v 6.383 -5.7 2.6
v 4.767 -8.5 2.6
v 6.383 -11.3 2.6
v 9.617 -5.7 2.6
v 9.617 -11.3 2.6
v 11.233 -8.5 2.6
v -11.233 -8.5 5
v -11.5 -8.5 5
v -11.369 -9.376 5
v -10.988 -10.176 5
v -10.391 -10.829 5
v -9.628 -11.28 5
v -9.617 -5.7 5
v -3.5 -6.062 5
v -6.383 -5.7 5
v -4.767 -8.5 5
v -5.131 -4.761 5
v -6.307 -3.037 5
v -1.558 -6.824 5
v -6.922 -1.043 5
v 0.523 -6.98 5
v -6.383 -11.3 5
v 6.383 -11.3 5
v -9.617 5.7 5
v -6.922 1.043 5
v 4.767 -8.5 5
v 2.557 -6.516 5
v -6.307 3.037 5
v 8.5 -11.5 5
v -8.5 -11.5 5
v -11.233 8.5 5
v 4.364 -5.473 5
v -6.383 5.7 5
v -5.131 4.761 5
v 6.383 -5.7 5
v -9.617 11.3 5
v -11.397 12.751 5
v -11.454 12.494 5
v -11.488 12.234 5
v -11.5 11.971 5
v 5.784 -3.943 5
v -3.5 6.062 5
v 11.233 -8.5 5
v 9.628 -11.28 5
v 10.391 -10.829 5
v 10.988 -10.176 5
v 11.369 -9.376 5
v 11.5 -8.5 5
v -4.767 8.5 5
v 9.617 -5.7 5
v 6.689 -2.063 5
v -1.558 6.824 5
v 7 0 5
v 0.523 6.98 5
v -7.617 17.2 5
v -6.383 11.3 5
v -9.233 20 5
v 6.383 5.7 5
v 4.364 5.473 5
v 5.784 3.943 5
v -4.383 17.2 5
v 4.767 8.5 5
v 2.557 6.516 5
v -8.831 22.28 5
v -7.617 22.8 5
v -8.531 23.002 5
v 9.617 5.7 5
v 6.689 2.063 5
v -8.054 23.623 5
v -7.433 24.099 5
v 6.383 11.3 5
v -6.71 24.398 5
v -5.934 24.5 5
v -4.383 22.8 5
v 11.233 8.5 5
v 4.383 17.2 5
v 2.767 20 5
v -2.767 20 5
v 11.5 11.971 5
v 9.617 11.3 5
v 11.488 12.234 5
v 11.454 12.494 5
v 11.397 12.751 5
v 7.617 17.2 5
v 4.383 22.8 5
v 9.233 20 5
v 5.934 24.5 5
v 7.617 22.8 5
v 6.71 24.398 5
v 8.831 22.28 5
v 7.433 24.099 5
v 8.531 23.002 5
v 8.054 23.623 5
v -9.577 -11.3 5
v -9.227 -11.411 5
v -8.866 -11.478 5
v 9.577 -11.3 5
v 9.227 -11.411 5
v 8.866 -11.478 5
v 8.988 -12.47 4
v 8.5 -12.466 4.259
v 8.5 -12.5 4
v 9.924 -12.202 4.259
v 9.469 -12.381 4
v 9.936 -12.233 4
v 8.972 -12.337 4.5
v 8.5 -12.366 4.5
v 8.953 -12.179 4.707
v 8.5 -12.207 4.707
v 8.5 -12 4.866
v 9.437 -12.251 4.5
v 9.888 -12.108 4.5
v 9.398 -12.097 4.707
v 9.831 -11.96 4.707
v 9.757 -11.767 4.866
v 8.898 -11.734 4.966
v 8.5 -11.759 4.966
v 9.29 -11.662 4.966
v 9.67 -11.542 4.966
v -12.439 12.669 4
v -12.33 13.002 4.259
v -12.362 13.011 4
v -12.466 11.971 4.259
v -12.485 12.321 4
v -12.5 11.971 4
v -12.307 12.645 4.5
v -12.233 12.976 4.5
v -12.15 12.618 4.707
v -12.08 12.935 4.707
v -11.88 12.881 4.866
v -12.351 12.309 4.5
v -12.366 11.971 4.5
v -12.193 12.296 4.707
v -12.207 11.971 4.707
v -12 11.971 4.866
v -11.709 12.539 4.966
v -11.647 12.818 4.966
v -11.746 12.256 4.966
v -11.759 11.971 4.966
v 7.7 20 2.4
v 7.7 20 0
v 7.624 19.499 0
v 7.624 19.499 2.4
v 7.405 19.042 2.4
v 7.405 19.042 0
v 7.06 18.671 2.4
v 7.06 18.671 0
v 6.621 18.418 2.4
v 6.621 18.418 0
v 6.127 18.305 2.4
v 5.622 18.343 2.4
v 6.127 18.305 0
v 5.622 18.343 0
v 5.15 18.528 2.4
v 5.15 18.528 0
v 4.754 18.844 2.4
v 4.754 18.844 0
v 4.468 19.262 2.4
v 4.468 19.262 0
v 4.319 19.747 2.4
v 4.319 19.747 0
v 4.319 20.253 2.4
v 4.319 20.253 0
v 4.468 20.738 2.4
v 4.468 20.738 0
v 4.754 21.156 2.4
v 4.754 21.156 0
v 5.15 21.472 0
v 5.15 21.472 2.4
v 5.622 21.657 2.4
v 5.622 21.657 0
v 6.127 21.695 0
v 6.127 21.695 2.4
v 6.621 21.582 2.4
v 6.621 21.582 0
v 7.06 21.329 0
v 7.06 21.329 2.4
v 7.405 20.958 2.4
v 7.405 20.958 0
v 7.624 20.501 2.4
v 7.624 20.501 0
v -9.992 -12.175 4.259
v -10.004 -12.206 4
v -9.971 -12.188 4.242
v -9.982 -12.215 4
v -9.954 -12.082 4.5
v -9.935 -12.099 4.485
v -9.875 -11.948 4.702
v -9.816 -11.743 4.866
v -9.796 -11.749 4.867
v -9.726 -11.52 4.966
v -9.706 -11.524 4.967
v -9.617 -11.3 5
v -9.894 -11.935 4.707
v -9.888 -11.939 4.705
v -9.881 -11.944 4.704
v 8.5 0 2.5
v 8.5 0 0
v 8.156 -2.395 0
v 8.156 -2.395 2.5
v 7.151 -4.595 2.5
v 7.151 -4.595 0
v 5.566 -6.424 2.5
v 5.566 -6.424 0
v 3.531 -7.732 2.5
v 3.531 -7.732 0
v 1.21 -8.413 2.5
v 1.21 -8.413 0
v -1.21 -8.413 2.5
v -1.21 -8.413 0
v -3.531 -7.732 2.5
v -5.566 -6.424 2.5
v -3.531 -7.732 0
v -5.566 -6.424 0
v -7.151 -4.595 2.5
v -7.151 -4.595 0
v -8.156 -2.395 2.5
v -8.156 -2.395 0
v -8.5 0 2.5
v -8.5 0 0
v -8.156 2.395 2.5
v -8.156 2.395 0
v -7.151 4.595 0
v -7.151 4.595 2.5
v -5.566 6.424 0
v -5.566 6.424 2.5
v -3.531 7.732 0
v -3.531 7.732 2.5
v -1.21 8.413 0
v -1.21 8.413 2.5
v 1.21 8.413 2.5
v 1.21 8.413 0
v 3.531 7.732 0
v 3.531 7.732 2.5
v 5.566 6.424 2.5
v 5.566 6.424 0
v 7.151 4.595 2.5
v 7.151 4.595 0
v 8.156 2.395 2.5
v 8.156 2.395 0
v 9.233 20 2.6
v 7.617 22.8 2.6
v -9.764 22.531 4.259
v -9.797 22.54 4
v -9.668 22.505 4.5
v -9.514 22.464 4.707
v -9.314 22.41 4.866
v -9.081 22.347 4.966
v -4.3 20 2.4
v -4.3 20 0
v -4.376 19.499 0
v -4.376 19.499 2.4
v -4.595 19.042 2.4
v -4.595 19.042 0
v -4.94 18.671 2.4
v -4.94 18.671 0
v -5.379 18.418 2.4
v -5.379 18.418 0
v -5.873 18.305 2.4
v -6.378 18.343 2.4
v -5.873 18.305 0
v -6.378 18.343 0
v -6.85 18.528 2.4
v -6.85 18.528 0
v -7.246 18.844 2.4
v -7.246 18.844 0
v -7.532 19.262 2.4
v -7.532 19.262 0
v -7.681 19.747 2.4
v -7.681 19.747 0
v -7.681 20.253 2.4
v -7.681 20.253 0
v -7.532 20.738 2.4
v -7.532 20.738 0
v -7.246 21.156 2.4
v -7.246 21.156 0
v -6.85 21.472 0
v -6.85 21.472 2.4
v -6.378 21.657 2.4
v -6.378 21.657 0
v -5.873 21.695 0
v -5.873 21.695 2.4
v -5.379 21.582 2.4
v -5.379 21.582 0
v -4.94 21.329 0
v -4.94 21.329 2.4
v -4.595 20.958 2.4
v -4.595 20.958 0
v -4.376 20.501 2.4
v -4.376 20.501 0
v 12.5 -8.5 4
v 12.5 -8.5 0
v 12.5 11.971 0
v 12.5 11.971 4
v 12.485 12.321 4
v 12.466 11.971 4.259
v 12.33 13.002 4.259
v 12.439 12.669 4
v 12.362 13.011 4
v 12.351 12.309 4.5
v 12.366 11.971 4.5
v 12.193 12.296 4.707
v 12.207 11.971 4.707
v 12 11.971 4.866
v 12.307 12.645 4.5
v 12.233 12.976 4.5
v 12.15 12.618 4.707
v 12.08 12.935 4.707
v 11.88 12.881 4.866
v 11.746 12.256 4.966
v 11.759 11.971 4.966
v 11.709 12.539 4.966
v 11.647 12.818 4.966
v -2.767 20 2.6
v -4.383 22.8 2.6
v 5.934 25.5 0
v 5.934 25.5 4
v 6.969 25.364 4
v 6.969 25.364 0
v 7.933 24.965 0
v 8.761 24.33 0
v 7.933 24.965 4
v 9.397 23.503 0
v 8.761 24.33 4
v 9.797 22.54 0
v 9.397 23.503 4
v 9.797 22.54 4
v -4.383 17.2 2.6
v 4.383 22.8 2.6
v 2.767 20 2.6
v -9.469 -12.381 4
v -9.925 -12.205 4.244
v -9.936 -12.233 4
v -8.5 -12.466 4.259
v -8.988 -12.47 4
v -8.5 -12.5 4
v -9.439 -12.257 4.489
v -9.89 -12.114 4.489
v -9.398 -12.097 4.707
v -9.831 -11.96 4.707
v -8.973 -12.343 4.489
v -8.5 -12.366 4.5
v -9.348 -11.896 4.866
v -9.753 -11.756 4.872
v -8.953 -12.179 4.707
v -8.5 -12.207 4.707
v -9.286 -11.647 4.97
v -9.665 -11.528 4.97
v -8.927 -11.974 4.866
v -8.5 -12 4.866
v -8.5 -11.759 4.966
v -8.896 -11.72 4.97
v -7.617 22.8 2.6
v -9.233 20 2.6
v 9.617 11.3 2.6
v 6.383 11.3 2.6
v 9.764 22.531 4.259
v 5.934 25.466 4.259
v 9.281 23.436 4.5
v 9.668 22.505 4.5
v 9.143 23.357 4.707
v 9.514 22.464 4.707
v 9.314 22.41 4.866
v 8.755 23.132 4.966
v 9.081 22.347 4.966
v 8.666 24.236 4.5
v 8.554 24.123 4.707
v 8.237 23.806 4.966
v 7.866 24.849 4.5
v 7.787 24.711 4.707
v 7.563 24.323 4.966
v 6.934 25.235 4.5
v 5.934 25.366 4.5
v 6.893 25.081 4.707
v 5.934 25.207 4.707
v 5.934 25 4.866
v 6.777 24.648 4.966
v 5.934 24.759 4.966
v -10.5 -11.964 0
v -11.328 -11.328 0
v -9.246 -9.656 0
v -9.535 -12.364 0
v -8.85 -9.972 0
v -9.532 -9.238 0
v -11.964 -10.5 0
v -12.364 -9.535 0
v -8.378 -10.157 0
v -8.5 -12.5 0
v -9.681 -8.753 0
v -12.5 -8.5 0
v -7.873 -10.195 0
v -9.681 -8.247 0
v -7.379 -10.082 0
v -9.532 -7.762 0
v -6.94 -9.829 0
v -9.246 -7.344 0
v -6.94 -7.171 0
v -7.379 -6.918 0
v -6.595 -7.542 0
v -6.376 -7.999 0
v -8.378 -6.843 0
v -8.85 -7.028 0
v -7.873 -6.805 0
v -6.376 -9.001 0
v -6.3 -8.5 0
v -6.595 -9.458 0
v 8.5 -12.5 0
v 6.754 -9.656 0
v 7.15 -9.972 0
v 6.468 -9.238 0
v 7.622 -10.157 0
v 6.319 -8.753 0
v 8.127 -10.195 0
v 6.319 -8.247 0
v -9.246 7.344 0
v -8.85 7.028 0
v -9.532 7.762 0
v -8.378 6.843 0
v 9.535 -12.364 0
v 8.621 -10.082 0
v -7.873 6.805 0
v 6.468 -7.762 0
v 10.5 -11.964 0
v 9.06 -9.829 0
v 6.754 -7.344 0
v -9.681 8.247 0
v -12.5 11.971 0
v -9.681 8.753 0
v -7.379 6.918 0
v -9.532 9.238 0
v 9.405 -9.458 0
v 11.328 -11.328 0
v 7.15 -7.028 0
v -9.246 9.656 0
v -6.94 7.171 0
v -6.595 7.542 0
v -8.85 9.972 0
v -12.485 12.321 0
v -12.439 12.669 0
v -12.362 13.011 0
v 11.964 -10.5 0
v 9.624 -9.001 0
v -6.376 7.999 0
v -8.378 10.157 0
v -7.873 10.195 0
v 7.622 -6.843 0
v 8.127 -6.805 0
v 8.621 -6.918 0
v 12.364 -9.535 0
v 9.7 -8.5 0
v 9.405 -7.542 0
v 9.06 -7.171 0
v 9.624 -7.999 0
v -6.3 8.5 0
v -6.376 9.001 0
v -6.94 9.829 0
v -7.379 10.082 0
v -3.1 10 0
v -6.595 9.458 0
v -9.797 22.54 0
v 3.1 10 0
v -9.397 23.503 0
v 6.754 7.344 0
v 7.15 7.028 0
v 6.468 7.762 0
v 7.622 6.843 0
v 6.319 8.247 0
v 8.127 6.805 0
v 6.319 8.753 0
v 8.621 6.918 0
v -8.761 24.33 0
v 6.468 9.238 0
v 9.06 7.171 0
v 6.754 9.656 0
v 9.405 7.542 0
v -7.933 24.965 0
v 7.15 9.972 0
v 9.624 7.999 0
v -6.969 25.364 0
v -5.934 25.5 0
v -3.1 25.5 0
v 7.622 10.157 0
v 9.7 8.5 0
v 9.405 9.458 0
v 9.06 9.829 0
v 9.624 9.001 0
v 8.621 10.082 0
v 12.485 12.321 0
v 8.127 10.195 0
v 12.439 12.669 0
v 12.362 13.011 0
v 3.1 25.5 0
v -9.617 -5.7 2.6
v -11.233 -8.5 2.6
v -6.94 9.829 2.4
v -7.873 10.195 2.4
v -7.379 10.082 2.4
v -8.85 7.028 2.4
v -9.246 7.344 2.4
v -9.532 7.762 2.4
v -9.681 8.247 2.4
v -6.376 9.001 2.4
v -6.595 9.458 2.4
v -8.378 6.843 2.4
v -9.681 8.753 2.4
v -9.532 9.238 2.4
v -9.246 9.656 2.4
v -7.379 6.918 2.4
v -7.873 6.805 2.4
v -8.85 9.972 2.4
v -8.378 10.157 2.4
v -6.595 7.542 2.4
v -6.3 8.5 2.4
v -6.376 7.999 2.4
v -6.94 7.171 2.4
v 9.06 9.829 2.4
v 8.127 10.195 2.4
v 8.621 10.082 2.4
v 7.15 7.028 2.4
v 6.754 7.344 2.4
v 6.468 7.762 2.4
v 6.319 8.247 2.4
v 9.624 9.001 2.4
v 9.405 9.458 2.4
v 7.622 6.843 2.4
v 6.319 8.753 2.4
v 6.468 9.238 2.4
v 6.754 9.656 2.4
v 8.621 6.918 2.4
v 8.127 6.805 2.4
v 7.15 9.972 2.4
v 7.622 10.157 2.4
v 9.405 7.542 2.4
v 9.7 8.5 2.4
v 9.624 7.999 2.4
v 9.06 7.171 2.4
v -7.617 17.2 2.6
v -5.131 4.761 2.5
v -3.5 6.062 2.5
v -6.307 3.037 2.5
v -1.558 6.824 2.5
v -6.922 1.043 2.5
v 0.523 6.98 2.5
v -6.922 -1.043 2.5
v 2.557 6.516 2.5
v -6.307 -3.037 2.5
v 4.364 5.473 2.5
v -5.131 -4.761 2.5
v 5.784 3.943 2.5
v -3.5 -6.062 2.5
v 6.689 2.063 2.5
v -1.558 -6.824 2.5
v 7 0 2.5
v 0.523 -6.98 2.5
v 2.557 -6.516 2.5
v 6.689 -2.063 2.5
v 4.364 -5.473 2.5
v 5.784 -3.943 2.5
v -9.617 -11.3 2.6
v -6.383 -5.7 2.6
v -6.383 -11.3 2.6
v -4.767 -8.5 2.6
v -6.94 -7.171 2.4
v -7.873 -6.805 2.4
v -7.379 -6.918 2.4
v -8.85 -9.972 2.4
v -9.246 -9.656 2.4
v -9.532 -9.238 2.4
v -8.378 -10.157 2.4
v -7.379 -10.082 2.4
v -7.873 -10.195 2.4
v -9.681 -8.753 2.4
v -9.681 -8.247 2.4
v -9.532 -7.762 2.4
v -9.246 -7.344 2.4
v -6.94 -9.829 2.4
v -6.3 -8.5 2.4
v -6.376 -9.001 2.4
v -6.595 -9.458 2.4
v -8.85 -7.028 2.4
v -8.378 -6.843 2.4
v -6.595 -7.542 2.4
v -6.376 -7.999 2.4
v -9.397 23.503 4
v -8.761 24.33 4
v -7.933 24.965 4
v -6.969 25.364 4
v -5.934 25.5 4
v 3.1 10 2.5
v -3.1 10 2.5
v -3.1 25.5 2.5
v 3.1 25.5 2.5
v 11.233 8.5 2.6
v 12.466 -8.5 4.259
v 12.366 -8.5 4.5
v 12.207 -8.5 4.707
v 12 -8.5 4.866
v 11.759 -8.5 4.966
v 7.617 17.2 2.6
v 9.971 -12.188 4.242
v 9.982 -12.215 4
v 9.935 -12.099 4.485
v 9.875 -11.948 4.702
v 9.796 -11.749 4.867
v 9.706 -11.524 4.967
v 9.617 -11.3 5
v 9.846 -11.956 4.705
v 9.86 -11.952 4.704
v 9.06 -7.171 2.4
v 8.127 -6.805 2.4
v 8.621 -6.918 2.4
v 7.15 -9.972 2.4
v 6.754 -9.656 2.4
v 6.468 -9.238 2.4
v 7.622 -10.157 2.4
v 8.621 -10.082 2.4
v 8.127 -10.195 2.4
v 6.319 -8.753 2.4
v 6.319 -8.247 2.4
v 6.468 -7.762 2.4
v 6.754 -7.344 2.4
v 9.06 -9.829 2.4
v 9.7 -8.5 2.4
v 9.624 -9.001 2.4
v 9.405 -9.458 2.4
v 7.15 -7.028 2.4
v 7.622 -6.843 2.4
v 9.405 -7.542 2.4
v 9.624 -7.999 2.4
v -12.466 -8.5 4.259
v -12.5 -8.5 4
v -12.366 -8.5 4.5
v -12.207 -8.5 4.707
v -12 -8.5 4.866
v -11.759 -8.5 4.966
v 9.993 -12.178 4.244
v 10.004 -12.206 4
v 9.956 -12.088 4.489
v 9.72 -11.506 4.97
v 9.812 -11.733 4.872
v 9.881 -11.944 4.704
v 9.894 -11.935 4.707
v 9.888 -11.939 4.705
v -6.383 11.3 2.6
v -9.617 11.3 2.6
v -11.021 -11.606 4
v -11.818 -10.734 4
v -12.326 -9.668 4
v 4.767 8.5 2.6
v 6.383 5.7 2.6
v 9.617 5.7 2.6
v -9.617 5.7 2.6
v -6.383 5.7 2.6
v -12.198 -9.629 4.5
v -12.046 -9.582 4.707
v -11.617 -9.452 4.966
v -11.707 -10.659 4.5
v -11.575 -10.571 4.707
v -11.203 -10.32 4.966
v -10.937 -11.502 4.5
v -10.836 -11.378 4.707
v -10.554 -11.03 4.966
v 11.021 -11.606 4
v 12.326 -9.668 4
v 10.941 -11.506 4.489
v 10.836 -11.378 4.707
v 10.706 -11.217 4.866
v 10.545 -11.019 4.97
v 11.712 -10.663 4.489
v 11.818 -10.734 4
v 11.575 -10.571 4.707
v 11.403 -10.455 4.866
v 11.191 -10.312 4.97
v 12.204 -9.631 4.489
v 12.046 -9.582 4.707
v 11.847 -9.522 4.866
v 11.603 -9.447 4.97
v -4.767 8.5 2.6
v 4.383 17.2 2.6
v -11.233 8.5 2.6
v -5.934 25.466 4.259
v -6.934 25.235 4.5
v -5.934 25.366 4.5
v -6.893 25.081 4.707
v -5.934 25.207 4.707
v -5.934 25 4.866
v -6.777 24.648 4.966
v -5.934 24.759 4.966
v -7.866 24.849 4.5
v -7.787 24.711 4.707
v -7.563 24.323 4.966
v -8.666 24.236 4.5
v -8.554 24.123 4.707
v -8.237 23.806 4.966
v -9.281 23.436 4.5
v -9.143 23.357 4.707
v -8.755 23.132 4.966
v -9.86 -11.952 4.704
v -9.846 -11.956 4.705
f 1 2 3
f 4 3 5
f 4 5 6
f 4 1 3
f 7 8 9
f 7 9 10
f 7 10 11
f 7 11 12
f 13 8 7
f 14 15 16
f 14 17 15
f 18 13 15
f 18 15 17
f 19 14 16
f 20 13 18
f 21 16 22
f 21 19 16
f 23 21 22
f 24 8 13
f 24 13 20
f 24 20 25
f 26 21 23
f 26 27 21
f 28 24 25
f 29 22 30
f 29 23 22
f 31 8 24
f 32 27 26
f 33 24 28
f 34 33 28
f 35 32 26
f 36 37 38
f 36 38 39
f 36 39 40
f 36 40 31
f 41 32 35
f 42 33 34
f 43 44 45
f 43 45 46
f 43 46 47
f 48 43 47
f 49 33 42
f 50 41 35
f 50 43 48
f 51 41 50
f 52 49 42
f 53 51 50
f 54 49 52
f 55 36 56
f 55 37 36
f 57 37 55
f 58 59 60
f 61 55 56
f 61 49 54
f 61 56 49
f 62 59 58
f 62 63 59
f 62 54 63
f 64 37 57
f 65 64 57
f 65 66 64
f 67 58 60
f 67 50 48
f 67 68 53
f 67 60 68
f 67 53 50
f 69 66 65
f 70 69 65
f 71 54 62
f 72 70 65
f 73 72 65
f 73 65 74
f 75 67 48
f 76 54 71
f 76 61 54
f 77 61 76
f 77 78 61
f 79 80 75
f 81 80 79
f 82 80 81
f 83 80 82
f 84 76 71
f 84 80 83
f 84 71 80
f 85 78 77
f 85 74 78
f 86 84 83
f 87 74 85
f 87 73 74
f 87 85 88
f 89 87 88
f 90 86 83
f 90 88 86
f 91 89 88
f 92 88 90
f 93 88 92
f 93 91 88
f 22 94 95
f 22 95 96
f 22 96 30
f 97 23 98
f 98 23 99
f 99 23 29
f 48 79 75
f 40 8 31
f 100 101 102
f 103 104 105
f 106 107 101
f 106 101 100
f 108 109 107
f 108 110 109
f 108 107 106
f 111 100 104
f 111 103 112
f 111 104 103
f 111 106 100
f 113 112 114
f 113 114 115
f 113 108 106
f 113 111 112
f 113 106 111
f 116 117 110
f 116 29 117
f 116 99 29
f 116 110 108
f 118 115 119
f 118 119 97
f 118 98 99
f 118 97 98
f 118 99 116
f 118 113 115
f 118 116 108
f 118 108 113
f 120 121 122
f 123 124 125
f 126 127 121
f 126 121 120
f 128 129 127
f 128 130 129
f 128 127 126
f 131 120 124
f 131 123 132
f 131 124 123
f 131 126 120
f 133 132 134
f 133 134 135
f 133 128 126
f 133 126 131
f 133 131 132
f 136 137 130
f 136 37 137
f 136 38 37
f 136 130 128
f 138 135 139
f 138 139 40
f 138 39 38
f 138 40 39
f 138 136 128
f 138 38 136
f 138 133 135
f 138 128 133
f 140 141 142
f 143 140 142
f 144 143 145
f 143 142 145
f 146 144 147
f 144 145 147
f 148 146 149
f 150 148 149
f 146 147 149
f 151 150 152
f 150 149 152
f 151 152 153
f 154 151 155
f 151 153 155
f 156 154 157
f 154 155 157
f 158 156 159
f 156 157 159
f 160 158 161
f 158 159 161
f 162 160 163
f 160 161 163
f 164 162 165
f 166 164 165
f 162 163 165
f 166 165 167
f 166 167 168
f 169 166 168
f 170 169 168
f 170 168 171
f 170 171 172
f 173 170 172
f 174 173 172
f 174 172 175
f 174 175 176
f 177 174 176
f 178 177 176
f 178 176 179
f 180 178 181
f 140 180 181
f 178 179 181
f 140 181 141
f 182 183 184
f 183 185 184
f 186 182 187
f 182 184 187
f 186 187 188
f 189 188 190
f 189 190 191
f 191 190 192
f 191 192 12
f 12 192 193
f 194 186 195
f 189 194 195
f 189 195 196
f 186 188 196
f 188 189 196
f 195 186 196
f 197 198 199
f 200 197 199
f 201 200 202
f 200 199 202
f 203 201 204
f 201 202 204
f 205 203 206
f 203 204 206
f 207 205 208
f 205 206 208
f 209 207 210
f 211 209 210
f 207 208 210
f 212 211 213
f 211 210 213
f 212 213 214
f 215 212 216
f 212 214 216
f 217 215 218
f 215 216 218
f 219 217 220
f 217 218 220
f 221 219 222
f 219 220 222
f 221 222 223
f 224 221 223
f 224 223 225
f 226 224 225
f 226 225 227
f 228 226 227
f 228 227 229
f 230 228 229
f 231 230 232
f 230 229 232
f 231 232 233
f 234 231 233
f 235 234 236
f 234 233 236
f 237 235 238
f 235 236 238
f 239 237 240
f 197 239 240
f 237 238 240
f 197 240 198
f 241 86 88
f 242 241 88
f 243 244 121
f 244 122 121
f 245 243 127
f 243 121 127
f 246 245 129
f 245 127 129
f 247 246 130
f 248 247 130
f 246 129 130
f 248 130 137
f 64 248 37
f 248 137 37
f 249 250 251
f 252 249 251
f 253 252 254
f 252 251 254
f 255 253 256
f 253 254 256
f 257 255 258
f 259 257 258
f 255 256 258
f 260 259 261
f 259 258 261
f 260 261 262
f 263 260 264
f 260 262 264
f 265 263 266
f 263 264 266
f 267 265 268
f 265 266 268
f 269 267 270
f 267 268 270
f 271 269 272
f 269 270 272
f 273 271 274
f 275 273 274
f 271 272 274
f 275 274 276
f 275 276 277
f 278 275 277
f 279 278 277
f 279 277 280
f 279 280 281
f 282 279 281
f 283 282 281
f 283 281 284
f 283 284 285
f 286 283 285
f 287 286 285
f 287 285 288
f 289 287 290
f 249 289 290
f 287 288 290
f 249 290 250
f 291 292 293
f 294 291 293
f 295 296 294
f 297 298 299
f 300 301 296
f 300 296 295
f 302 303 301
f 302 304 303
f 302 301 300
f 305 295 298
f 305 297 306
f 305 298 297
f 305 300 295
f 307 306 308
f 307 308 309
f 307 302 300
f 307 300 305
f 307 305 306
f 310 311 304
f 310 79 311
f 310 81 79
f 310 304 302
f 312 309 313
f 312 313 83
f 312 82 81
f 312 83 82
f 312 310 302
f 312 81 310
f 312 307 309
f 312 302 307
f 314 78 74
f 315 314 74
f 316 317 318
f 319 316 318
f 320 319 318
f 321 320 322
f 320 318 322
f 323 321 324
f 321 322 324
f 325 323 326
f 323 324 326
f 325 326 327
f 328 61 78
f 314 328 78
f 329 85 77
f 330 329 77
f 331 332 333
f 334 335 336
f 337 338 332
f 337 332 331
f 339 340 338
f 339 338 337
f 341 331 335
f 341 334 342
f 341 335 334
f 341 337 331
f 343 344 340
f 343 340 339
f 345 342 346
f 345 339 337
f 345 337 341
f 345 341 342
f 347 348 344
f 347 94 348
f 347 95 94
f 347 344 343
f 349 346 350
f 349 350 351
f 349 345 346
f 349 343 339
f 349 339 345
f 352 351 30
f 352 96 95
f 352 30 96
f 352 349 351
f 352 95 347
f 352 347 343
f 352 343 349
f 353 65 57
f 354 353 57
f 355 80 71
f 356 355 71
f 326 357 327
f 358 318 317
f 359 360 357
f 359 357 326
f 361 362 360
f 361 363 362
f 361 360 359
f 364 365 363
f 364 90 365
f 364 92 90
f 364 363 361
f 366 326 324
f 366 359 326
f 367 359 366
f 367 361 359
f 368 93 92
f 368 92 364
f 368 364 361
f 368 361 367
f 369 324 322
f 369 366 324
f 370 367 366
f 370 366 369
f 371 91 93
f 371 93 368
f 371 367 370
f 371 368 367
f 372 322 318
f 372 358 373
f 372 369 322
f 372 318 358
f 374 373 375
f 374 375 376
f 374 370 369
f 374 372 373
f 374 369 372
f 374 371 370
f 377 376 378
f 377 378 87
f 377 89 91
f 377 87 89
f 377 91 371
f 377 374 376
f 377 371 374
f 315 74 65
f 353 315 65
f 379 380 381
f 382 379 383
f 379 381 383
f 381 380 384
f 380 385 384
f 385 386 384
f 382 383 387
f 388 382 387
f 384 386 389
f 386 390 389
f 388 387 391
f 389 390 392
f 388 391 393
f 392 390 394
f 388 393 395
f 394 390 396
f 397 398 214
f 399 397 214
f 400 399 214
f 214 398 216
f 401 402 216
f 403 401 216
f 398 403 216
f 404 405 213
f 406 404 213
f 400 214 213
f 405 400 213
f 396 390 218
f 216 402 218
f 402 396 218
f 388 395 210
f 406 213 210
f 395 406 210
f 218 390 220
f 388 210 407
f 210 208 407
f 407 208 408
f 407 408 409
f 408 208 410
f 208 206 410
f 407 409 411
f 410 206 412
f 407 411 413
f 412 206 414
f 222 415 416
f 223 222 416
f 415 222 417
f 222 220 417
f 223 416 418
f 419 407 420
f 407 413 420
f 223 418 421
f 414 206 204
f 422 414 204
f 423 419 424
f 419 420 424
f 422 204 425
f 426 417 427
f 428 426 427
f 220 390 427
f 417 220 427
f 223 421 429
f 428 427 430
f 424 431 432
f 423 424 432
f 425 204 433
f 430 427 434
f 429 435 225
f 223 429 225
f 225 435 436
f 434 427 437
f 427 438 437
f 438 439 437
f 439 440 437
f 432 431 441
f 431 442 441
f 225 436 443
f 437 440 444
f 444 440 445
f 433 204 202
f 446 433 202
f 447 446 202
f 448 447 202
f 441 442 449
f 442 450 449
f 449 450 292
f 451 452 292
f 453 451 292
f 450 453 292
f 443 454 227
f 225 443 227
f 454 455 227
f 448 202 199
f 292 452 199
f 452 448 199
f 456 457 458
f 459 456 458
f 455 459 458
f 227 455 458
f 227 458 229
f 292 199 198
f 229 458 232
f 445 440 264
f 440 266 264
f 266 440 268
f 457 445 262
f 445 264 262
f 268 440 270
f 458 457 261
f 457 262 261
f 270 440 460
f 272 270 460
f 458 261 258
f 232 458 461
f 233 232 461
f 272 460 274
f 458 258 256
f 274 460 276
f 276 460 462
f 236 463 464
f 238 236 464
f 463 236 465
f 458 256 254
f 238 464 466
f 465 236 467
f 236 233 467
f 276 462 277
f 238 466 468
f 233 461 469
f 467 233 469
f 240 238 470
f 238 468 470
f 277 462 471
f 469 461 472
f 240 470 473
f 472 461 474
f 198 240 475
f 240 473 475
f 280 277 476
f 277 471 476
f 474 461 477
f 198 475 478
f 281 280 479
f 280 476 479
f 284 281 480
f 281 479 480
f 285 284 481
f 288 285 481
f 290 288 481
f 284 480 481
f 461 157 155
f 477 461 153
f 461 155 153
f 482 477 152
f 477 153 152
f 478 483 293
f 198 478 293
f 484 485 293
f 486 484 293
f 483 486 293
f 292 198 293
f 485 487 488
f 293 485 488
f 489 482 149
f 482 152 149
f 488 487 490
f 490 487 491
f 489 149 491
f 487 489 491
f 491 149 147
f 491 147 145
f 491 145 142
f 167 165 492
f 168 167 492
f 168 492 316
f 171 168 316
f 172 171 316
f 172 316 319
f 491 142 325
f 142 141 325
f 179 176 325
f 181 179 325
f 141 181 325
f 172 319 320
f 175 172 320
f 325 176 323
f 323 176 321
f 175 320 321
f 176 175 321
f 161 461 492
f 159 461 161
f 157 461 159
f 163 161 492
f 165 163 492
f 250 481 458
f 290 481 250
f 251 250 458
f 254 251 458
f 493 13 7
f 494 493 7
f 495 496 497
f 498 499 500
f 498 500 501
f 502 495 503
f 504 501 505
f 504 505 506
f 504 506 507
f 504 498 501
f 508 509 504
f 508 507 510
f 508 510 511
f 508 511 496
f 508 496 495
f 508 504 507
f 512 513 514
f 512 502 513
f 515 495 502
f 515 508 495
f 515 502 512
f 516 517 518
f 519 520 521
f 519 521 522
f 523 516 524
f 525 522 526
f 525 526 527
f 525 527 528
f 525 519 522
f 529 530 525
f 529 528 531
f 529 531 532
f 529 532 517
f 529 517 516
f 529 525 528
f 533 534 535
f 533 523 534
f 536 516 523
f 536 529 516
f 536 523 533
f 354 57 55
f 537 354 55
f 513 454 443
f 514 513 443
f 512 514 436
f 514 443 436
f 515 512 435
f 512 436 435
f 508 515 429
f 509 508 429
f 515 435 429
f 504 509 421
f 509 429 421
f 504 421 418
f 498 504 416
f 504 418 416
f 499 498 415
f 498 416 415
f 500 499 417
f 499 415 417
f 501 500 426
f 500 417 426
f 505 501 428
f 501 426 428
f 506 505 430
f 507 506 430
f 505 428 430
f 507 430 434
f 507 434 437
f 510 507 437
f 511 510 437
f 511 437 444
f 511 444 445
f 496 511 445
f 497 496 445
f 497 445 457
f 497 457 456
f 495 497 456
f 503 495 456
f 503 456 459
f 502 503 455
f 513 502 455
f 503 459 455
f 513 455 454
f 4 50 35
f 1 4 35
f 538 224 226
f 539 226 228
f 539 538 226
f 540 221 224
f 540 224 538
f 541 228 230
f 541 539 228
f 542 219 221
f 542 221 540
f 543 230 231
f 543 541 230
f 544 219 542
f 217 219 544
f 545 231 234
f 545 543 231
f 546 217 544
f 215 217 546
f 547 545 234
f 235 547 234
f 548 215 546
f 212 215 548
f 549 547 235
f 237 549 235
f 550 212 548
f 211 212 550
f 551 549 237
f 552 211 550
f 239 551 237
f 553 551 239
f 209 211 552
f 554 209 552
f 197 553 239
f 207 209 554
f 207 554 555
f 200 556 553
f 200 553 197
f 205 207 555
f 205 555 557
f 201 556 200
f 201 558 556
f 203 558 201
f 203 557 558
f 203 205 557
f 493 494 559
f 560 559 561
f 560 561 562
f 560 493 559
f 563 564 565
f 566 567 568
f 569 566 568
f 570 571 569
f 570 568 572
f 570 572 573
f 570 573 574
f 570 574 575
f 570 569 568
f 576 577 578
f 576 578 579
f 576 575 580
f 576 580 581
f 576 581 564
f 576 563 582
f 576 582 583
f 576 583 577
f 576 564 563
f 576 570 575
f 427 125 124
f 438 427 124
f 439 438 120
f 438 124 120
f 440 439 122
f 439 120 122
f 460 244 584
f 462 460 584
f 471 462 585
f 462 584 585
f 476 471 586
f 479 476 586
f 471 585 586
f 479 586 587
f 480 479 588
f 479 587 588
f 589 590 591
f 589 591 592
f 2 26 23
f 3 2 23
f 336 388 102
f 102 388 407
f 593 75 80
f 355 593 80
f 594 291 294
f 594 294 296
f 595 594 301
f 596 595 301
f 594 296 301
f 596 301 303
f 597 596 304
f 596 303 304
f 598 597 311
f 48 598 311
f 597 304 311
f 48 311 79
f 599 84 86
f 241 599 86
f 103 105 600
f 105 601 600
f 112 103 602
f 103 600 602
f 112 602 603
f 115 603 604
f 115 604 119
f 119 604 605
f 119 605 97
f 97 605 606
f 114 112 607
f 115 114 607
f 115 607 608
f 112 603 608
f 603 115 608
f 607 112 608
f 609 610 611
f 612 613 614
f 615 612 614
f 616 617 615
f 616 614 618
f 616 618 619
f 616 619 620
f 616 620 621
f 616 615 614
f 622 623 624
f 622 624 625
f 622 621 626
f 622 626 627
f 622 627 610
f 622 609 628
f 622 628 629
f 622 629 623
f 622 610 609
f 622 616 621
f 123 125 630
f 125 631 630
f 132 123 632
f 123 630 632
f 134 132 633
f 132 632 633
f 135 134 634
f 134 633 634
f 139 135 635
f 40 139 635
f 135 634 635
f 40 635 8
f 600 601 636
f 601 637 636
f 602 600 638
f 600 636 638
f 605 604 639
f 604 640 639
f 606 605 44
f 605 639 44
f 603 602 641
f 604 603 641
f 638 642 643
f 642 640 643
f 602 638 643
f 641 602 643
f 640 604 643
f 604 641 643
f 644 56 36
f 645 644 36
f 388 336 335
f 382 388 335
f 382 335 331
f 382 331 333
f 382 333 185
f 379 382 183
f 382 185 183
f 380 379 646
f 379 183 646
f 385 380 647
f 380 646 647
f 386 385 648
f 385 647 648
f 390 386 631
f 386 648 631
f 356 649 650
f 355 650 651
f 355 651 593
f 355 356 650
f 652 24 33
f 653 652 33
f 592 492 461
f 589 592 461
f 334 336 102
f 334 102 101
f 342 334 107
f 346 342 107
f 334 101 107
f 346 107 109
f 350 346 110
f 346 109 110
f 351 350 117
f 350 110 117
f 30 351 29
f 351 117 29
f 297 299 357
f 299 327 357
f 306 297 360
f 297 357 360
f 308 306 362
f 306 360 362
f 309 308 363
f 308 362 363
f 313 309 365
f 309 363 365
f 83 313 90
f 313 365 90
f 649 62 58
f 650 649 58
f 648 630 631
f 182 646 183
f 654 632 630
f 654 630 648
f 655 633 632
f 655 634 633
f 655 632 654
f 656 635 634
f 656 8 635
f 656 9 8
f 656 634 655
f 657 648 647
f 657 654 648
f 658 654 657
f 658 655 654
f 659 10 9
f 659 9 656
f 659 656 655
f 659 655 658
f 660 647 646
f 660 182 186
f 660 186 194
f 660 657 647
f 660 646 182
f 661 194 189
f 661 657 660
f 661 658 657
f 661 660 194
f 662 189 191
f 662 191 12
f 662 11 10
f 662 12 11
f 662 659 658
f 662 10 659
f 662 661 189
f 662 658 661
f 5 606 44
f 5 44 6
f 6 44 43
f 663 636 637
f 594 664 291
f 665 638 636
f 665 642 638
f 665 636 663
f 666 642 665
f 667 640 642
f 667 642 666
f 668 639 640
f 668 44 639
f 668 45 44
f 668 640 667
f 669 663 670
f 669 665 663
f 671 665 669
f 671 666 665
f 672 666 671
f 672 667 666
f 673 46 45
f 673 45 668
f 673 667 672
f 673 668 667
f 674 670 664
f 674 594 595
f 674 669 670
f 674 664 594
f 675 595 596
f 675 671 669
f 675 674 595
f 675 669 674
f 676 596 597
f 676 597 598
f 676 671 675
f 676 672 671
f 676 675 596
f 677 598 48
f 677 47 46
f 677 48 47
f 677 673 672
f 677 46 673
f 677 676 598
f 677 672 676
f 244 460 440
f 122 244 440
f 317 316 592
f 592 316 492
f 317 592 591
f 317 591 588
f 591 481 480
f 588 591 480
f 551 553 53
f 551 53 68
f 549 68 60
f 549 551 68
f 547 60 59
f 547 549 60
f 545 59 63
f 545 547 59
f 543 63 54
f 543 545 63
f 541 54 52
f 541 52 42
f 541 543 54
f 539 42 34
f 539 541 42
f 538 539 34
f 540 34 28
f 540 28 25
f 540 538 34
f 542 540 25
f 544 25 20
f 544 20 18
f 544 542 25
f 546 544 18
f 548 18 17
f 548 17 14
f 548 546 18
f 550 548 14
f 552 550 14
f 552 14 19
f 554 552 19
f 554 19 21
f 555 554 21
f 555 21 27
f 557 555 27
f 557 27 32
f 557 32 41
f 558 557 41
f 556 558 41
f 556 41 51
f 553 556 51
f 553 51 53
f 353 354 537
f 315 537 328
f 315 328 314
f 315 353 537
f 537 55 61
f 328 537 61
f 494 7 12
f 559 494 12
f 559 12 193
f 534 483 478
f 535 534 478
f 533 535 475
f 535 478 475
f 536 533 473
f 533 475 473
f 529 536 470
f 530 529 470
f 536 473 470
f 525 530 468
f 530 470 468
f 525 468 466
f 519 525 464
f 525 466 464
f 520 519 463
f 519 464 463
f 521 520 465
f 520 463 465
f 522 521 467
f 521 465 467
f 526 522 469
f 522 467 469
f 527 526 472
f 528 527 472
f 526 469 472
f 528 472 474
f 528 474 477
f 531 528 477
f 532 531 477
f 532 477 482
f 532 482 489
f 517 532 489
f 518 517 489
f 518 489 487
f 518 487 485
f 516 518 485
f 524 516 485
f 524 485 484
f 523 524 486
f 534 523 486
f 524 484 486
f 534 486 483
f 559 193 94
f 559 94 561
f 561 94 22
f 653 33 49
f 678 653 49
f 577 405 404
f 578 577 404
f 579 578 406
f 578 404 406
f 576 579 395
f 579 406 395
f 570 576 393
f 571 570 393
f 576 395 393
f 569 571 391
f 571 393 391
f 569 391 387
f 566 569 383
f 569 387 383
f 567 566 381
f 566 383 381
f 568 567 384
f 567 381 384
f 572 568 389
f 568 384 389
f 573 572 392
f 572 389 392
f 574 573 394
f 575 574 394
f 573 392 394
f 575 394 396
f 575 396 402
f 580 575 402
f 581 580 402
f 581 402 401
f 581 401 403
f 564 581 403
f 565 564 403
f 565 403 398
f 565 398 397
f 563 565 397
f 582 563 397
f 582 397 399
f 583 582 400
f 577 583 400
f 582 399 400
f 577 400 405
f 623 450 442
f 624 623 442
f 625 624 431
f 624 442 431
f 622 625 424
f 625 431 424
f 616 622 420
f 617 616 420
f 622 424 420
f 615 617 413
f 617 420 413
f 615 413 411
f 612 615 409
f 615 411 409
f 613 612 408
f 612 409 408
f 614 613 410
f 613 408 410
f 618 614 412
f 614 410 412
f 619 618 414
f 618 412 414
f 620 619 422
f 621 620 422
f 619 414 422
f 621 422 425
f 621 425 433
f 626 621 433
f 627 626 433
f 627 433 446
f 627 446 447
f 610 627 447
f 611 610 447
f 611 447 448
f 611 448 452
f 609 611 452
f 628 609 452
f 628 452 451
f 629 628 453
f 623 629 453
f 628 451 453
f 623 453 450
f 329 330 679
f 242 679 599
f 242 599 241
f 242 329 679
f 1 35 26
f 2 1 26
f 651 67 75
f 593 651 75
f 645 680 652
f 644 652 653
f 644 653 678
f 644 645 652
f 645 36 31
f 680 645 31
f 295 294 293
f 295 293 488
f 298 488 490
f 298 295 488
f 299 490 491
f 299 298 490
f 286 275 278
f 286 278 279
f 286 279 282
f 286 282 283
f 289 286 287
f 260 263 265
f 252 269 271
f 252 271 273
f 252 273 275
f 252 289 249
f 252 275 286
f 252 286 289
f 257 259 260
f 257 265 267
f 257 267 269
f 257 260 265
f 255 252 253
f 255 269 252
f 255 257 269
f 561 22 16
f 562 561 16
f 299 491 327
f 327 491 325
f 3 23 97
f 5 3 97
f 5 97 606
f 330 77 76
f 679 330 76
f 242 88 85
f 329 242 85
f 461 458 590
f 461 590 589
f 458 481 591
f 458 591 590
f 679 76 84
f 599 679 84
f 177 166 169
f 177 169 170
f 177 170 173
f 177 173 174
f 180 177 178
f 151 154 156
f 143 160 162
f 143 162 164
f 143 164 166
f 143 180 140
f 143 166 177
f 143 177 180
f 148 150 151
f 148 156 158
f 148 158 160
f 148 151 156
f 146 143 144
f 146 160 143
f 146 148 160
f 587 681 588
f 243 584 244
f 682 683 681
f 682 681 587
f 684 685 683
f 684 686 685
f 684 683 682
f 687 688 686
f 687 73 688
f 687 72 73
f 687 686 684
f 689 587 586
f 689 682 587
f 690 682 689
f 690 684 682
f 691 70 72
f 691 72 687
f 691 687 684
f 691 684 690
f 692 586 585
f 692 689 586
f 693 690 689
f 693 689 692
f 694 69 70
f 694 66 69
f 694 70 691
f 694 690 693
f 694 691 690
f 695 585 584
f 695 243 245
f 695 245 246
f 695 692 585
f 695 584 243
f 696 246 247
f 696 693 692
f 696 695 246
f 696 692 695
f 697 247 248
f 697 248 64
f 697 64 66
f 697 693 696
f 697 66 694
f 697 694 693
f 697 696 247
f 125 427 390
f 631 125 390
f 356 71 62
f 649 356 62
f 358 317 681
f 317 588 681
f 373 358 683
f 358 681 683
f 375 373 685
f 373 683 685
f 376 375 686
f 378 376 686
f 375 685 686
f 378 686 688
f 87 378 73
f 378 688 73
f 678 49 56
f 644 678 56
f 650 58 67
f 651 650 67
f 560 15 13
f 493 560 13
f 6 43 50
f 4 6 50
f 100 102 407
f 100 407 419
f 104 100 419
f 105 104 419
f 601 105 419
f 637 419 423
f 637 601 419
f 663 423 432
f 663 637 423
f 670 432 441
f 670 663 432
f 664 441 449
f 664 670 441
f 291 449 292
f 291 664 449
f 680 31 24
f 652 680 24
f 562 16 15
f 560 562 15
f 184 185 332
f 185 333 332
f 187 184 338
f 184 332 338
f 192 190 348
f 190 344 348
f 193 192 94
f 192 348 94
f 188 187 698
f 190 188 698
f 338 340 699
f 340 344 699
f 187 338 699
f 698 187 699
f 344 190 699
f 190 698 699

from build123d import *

# Parameters (mm, degrees)
SKETCH_R        = 7
PAD_DEPTH       = 5
SKETCH001_R     = 8.5
SKETCH001_W     = 6.2
SKETCH001_H     = 20
POCKET_DEPTH    = 2.5
FILLET_R        = 4
FILLET001_R     = 4
POCKET001_DEPTH = 2.4
SKETCH003_R     = 1.7
POCKET002_DEPTH = 2.4
FILLET002_R     = 4
FILLET003_R     = 4
FILLET004_R     = 4
FILLET005_R     = 4
FILLET006_R     = 1


with BuildPart() as part:
    # Sketch → Pad (new body)
    with BuildSketch(Plane.XY):
        Polygon((-12.5, -12.5), (12.5, -12.5), (12.5, 12.5), (9, 25.5), (-9, 25.5), (-12.5, 12.5), align=None)
        Circle(SKETCH_R, mode=Mode.SUBTRACT)
    extrude(amount=PAD_DEPTH)

    # Sketch001 → Pocket (cut)
    with BuildSketch(Plane(origin=(0, 0, 0), x_dir=(1, 0, 0), z_dir=(0, 0, -1))):
        Circle(SKETCH001_R)
        with Locations((0, -20)):
            Rectangle(SKETCH001_W, SKETCH001_H)
    extrude(amount=-POCKET_DEPTH, mode=Mode.SUBTRACT)

    # Fillet
    fillet_edges = [part.edges().sort_by_distance(p)[0] for p in [
        (-12.5, -12.5, 2.5),
    ]]
    fillet(fillet_edges, radius=FILLET_R)

    # Fillet001
    fillet001_edges = [part.edges().sort_by_distance(p)[0] for p in [
        (12.5, -12.5, 2.5),
    ]]
    fillet(fillet001_edges, radius=FILLET001_R)

    # Sketch002 → Pocket001 (cut)
    with BuildSketch(Plane.XY.offset(5)):
        Polygon((-9.616581, 11.3), (-11.233162, 8.5), (-9.616581, 5.7), (-6.383419, 5.7), (-4.766838, 8.5), (-6.383419, 11.3), align=None)
        Polygon((6.383419, 11.3), (4.766838, 8.5), (6.383419, 5.7), (9.616581, 5.7), (11.233162, 8.5), (9.616581, 11.3), align=None)
        Polygon((-9.616581, -5.7), (-11.233162, -8.5), (-9.616581, -11.3), (-6.383419, -11.3), (-4.766838, -8.5), (-6.383419, -5.7), align=None)
        Polygon((6.383419, -5.7), (4.766838, -8.5), (6.383419, -11.3), (9.616581, -11.3), (11.233162, -8.5), (9.616581, -5.7), align=None)
        Polygon((-7.616581, 22.8), (-9.233162, 20), (-7.616581, 17.2), (-4.383419, 17.2), (-2.766838, 20), (-4.383419, 22.8), align=None)
        Polygon((4.383419, 22.8), (2.766838, 20), (4.383419, 17.2), (7.616581, 17.2), (9.233162, 20), (7.616581, 22.8), align=None)
    extrude(amount=-POCKET001_DEPTH, mode=Mode.SUBTRACT)

    # Sketch003 → Pocket002 (cut)
    with BuildSketch(Plane(origin=(0, 0, 0), x_dir=(1, 0, 0), z_dir=(0, 0, -1))):
        with Locations((-8, 8.5)):
            Circle(SKETCH003_R)
        with Locations((8, 8.5)):
            Circle(SKETCH003_R)
        with Locations((-8, -8.5)):
            Circle(SKETCH003_R)
        with Locations((8, -8.5)):
            Circle(SKETCH003_R)
        with Locations((-6, -20)):
            Circle(SKETCH003_R)
        with Locations((6, -20)):
            Circle(SKETCH003_R)
    extrude(amount=-POCKET002_DEPTH, mode=Mode.SUBTRACT)

    # Fillet002
    fillet002_edges = [part.edges().sort_by_distance(p)[0] for p in [
        (12.5, 12.5, 2.5),
    ]]
    fillet(fillet002_edges, radius=FILLET002_R)

    # Fillet003
    fillet003_edges = [part.edges().sort_by_distance(p)[0] for p in [
        (-12.5, 12.5, 2.5),
    ]]
    fillet(fillet003_edges, radius=FILLET003_R)

    # Fillet004
    fillet004_edges = [part.edges().sort_by_distance(p)[0] for p in [
        (-9, 25.5, 2.5),
    ]]
    fillet(fillet004_edges, radius=FILLET004_R)

    # Fillet005
    fillet005_edges = [part.edges().sort_by_distance(p)[0] for p in [
        (9, 25.5, 2.5),
    ]]
    fillet(fillet005_edges, radius=FILLET005_R)

    # Fillet006
    fillet006_edges = [part.edges().sort_by_distance(p)[0] for p in [
        (11.079707, 17.775373, 5),
    ]]
    fillet(fillet006_edges, radius=FILLET006_R)


solid = part.part
